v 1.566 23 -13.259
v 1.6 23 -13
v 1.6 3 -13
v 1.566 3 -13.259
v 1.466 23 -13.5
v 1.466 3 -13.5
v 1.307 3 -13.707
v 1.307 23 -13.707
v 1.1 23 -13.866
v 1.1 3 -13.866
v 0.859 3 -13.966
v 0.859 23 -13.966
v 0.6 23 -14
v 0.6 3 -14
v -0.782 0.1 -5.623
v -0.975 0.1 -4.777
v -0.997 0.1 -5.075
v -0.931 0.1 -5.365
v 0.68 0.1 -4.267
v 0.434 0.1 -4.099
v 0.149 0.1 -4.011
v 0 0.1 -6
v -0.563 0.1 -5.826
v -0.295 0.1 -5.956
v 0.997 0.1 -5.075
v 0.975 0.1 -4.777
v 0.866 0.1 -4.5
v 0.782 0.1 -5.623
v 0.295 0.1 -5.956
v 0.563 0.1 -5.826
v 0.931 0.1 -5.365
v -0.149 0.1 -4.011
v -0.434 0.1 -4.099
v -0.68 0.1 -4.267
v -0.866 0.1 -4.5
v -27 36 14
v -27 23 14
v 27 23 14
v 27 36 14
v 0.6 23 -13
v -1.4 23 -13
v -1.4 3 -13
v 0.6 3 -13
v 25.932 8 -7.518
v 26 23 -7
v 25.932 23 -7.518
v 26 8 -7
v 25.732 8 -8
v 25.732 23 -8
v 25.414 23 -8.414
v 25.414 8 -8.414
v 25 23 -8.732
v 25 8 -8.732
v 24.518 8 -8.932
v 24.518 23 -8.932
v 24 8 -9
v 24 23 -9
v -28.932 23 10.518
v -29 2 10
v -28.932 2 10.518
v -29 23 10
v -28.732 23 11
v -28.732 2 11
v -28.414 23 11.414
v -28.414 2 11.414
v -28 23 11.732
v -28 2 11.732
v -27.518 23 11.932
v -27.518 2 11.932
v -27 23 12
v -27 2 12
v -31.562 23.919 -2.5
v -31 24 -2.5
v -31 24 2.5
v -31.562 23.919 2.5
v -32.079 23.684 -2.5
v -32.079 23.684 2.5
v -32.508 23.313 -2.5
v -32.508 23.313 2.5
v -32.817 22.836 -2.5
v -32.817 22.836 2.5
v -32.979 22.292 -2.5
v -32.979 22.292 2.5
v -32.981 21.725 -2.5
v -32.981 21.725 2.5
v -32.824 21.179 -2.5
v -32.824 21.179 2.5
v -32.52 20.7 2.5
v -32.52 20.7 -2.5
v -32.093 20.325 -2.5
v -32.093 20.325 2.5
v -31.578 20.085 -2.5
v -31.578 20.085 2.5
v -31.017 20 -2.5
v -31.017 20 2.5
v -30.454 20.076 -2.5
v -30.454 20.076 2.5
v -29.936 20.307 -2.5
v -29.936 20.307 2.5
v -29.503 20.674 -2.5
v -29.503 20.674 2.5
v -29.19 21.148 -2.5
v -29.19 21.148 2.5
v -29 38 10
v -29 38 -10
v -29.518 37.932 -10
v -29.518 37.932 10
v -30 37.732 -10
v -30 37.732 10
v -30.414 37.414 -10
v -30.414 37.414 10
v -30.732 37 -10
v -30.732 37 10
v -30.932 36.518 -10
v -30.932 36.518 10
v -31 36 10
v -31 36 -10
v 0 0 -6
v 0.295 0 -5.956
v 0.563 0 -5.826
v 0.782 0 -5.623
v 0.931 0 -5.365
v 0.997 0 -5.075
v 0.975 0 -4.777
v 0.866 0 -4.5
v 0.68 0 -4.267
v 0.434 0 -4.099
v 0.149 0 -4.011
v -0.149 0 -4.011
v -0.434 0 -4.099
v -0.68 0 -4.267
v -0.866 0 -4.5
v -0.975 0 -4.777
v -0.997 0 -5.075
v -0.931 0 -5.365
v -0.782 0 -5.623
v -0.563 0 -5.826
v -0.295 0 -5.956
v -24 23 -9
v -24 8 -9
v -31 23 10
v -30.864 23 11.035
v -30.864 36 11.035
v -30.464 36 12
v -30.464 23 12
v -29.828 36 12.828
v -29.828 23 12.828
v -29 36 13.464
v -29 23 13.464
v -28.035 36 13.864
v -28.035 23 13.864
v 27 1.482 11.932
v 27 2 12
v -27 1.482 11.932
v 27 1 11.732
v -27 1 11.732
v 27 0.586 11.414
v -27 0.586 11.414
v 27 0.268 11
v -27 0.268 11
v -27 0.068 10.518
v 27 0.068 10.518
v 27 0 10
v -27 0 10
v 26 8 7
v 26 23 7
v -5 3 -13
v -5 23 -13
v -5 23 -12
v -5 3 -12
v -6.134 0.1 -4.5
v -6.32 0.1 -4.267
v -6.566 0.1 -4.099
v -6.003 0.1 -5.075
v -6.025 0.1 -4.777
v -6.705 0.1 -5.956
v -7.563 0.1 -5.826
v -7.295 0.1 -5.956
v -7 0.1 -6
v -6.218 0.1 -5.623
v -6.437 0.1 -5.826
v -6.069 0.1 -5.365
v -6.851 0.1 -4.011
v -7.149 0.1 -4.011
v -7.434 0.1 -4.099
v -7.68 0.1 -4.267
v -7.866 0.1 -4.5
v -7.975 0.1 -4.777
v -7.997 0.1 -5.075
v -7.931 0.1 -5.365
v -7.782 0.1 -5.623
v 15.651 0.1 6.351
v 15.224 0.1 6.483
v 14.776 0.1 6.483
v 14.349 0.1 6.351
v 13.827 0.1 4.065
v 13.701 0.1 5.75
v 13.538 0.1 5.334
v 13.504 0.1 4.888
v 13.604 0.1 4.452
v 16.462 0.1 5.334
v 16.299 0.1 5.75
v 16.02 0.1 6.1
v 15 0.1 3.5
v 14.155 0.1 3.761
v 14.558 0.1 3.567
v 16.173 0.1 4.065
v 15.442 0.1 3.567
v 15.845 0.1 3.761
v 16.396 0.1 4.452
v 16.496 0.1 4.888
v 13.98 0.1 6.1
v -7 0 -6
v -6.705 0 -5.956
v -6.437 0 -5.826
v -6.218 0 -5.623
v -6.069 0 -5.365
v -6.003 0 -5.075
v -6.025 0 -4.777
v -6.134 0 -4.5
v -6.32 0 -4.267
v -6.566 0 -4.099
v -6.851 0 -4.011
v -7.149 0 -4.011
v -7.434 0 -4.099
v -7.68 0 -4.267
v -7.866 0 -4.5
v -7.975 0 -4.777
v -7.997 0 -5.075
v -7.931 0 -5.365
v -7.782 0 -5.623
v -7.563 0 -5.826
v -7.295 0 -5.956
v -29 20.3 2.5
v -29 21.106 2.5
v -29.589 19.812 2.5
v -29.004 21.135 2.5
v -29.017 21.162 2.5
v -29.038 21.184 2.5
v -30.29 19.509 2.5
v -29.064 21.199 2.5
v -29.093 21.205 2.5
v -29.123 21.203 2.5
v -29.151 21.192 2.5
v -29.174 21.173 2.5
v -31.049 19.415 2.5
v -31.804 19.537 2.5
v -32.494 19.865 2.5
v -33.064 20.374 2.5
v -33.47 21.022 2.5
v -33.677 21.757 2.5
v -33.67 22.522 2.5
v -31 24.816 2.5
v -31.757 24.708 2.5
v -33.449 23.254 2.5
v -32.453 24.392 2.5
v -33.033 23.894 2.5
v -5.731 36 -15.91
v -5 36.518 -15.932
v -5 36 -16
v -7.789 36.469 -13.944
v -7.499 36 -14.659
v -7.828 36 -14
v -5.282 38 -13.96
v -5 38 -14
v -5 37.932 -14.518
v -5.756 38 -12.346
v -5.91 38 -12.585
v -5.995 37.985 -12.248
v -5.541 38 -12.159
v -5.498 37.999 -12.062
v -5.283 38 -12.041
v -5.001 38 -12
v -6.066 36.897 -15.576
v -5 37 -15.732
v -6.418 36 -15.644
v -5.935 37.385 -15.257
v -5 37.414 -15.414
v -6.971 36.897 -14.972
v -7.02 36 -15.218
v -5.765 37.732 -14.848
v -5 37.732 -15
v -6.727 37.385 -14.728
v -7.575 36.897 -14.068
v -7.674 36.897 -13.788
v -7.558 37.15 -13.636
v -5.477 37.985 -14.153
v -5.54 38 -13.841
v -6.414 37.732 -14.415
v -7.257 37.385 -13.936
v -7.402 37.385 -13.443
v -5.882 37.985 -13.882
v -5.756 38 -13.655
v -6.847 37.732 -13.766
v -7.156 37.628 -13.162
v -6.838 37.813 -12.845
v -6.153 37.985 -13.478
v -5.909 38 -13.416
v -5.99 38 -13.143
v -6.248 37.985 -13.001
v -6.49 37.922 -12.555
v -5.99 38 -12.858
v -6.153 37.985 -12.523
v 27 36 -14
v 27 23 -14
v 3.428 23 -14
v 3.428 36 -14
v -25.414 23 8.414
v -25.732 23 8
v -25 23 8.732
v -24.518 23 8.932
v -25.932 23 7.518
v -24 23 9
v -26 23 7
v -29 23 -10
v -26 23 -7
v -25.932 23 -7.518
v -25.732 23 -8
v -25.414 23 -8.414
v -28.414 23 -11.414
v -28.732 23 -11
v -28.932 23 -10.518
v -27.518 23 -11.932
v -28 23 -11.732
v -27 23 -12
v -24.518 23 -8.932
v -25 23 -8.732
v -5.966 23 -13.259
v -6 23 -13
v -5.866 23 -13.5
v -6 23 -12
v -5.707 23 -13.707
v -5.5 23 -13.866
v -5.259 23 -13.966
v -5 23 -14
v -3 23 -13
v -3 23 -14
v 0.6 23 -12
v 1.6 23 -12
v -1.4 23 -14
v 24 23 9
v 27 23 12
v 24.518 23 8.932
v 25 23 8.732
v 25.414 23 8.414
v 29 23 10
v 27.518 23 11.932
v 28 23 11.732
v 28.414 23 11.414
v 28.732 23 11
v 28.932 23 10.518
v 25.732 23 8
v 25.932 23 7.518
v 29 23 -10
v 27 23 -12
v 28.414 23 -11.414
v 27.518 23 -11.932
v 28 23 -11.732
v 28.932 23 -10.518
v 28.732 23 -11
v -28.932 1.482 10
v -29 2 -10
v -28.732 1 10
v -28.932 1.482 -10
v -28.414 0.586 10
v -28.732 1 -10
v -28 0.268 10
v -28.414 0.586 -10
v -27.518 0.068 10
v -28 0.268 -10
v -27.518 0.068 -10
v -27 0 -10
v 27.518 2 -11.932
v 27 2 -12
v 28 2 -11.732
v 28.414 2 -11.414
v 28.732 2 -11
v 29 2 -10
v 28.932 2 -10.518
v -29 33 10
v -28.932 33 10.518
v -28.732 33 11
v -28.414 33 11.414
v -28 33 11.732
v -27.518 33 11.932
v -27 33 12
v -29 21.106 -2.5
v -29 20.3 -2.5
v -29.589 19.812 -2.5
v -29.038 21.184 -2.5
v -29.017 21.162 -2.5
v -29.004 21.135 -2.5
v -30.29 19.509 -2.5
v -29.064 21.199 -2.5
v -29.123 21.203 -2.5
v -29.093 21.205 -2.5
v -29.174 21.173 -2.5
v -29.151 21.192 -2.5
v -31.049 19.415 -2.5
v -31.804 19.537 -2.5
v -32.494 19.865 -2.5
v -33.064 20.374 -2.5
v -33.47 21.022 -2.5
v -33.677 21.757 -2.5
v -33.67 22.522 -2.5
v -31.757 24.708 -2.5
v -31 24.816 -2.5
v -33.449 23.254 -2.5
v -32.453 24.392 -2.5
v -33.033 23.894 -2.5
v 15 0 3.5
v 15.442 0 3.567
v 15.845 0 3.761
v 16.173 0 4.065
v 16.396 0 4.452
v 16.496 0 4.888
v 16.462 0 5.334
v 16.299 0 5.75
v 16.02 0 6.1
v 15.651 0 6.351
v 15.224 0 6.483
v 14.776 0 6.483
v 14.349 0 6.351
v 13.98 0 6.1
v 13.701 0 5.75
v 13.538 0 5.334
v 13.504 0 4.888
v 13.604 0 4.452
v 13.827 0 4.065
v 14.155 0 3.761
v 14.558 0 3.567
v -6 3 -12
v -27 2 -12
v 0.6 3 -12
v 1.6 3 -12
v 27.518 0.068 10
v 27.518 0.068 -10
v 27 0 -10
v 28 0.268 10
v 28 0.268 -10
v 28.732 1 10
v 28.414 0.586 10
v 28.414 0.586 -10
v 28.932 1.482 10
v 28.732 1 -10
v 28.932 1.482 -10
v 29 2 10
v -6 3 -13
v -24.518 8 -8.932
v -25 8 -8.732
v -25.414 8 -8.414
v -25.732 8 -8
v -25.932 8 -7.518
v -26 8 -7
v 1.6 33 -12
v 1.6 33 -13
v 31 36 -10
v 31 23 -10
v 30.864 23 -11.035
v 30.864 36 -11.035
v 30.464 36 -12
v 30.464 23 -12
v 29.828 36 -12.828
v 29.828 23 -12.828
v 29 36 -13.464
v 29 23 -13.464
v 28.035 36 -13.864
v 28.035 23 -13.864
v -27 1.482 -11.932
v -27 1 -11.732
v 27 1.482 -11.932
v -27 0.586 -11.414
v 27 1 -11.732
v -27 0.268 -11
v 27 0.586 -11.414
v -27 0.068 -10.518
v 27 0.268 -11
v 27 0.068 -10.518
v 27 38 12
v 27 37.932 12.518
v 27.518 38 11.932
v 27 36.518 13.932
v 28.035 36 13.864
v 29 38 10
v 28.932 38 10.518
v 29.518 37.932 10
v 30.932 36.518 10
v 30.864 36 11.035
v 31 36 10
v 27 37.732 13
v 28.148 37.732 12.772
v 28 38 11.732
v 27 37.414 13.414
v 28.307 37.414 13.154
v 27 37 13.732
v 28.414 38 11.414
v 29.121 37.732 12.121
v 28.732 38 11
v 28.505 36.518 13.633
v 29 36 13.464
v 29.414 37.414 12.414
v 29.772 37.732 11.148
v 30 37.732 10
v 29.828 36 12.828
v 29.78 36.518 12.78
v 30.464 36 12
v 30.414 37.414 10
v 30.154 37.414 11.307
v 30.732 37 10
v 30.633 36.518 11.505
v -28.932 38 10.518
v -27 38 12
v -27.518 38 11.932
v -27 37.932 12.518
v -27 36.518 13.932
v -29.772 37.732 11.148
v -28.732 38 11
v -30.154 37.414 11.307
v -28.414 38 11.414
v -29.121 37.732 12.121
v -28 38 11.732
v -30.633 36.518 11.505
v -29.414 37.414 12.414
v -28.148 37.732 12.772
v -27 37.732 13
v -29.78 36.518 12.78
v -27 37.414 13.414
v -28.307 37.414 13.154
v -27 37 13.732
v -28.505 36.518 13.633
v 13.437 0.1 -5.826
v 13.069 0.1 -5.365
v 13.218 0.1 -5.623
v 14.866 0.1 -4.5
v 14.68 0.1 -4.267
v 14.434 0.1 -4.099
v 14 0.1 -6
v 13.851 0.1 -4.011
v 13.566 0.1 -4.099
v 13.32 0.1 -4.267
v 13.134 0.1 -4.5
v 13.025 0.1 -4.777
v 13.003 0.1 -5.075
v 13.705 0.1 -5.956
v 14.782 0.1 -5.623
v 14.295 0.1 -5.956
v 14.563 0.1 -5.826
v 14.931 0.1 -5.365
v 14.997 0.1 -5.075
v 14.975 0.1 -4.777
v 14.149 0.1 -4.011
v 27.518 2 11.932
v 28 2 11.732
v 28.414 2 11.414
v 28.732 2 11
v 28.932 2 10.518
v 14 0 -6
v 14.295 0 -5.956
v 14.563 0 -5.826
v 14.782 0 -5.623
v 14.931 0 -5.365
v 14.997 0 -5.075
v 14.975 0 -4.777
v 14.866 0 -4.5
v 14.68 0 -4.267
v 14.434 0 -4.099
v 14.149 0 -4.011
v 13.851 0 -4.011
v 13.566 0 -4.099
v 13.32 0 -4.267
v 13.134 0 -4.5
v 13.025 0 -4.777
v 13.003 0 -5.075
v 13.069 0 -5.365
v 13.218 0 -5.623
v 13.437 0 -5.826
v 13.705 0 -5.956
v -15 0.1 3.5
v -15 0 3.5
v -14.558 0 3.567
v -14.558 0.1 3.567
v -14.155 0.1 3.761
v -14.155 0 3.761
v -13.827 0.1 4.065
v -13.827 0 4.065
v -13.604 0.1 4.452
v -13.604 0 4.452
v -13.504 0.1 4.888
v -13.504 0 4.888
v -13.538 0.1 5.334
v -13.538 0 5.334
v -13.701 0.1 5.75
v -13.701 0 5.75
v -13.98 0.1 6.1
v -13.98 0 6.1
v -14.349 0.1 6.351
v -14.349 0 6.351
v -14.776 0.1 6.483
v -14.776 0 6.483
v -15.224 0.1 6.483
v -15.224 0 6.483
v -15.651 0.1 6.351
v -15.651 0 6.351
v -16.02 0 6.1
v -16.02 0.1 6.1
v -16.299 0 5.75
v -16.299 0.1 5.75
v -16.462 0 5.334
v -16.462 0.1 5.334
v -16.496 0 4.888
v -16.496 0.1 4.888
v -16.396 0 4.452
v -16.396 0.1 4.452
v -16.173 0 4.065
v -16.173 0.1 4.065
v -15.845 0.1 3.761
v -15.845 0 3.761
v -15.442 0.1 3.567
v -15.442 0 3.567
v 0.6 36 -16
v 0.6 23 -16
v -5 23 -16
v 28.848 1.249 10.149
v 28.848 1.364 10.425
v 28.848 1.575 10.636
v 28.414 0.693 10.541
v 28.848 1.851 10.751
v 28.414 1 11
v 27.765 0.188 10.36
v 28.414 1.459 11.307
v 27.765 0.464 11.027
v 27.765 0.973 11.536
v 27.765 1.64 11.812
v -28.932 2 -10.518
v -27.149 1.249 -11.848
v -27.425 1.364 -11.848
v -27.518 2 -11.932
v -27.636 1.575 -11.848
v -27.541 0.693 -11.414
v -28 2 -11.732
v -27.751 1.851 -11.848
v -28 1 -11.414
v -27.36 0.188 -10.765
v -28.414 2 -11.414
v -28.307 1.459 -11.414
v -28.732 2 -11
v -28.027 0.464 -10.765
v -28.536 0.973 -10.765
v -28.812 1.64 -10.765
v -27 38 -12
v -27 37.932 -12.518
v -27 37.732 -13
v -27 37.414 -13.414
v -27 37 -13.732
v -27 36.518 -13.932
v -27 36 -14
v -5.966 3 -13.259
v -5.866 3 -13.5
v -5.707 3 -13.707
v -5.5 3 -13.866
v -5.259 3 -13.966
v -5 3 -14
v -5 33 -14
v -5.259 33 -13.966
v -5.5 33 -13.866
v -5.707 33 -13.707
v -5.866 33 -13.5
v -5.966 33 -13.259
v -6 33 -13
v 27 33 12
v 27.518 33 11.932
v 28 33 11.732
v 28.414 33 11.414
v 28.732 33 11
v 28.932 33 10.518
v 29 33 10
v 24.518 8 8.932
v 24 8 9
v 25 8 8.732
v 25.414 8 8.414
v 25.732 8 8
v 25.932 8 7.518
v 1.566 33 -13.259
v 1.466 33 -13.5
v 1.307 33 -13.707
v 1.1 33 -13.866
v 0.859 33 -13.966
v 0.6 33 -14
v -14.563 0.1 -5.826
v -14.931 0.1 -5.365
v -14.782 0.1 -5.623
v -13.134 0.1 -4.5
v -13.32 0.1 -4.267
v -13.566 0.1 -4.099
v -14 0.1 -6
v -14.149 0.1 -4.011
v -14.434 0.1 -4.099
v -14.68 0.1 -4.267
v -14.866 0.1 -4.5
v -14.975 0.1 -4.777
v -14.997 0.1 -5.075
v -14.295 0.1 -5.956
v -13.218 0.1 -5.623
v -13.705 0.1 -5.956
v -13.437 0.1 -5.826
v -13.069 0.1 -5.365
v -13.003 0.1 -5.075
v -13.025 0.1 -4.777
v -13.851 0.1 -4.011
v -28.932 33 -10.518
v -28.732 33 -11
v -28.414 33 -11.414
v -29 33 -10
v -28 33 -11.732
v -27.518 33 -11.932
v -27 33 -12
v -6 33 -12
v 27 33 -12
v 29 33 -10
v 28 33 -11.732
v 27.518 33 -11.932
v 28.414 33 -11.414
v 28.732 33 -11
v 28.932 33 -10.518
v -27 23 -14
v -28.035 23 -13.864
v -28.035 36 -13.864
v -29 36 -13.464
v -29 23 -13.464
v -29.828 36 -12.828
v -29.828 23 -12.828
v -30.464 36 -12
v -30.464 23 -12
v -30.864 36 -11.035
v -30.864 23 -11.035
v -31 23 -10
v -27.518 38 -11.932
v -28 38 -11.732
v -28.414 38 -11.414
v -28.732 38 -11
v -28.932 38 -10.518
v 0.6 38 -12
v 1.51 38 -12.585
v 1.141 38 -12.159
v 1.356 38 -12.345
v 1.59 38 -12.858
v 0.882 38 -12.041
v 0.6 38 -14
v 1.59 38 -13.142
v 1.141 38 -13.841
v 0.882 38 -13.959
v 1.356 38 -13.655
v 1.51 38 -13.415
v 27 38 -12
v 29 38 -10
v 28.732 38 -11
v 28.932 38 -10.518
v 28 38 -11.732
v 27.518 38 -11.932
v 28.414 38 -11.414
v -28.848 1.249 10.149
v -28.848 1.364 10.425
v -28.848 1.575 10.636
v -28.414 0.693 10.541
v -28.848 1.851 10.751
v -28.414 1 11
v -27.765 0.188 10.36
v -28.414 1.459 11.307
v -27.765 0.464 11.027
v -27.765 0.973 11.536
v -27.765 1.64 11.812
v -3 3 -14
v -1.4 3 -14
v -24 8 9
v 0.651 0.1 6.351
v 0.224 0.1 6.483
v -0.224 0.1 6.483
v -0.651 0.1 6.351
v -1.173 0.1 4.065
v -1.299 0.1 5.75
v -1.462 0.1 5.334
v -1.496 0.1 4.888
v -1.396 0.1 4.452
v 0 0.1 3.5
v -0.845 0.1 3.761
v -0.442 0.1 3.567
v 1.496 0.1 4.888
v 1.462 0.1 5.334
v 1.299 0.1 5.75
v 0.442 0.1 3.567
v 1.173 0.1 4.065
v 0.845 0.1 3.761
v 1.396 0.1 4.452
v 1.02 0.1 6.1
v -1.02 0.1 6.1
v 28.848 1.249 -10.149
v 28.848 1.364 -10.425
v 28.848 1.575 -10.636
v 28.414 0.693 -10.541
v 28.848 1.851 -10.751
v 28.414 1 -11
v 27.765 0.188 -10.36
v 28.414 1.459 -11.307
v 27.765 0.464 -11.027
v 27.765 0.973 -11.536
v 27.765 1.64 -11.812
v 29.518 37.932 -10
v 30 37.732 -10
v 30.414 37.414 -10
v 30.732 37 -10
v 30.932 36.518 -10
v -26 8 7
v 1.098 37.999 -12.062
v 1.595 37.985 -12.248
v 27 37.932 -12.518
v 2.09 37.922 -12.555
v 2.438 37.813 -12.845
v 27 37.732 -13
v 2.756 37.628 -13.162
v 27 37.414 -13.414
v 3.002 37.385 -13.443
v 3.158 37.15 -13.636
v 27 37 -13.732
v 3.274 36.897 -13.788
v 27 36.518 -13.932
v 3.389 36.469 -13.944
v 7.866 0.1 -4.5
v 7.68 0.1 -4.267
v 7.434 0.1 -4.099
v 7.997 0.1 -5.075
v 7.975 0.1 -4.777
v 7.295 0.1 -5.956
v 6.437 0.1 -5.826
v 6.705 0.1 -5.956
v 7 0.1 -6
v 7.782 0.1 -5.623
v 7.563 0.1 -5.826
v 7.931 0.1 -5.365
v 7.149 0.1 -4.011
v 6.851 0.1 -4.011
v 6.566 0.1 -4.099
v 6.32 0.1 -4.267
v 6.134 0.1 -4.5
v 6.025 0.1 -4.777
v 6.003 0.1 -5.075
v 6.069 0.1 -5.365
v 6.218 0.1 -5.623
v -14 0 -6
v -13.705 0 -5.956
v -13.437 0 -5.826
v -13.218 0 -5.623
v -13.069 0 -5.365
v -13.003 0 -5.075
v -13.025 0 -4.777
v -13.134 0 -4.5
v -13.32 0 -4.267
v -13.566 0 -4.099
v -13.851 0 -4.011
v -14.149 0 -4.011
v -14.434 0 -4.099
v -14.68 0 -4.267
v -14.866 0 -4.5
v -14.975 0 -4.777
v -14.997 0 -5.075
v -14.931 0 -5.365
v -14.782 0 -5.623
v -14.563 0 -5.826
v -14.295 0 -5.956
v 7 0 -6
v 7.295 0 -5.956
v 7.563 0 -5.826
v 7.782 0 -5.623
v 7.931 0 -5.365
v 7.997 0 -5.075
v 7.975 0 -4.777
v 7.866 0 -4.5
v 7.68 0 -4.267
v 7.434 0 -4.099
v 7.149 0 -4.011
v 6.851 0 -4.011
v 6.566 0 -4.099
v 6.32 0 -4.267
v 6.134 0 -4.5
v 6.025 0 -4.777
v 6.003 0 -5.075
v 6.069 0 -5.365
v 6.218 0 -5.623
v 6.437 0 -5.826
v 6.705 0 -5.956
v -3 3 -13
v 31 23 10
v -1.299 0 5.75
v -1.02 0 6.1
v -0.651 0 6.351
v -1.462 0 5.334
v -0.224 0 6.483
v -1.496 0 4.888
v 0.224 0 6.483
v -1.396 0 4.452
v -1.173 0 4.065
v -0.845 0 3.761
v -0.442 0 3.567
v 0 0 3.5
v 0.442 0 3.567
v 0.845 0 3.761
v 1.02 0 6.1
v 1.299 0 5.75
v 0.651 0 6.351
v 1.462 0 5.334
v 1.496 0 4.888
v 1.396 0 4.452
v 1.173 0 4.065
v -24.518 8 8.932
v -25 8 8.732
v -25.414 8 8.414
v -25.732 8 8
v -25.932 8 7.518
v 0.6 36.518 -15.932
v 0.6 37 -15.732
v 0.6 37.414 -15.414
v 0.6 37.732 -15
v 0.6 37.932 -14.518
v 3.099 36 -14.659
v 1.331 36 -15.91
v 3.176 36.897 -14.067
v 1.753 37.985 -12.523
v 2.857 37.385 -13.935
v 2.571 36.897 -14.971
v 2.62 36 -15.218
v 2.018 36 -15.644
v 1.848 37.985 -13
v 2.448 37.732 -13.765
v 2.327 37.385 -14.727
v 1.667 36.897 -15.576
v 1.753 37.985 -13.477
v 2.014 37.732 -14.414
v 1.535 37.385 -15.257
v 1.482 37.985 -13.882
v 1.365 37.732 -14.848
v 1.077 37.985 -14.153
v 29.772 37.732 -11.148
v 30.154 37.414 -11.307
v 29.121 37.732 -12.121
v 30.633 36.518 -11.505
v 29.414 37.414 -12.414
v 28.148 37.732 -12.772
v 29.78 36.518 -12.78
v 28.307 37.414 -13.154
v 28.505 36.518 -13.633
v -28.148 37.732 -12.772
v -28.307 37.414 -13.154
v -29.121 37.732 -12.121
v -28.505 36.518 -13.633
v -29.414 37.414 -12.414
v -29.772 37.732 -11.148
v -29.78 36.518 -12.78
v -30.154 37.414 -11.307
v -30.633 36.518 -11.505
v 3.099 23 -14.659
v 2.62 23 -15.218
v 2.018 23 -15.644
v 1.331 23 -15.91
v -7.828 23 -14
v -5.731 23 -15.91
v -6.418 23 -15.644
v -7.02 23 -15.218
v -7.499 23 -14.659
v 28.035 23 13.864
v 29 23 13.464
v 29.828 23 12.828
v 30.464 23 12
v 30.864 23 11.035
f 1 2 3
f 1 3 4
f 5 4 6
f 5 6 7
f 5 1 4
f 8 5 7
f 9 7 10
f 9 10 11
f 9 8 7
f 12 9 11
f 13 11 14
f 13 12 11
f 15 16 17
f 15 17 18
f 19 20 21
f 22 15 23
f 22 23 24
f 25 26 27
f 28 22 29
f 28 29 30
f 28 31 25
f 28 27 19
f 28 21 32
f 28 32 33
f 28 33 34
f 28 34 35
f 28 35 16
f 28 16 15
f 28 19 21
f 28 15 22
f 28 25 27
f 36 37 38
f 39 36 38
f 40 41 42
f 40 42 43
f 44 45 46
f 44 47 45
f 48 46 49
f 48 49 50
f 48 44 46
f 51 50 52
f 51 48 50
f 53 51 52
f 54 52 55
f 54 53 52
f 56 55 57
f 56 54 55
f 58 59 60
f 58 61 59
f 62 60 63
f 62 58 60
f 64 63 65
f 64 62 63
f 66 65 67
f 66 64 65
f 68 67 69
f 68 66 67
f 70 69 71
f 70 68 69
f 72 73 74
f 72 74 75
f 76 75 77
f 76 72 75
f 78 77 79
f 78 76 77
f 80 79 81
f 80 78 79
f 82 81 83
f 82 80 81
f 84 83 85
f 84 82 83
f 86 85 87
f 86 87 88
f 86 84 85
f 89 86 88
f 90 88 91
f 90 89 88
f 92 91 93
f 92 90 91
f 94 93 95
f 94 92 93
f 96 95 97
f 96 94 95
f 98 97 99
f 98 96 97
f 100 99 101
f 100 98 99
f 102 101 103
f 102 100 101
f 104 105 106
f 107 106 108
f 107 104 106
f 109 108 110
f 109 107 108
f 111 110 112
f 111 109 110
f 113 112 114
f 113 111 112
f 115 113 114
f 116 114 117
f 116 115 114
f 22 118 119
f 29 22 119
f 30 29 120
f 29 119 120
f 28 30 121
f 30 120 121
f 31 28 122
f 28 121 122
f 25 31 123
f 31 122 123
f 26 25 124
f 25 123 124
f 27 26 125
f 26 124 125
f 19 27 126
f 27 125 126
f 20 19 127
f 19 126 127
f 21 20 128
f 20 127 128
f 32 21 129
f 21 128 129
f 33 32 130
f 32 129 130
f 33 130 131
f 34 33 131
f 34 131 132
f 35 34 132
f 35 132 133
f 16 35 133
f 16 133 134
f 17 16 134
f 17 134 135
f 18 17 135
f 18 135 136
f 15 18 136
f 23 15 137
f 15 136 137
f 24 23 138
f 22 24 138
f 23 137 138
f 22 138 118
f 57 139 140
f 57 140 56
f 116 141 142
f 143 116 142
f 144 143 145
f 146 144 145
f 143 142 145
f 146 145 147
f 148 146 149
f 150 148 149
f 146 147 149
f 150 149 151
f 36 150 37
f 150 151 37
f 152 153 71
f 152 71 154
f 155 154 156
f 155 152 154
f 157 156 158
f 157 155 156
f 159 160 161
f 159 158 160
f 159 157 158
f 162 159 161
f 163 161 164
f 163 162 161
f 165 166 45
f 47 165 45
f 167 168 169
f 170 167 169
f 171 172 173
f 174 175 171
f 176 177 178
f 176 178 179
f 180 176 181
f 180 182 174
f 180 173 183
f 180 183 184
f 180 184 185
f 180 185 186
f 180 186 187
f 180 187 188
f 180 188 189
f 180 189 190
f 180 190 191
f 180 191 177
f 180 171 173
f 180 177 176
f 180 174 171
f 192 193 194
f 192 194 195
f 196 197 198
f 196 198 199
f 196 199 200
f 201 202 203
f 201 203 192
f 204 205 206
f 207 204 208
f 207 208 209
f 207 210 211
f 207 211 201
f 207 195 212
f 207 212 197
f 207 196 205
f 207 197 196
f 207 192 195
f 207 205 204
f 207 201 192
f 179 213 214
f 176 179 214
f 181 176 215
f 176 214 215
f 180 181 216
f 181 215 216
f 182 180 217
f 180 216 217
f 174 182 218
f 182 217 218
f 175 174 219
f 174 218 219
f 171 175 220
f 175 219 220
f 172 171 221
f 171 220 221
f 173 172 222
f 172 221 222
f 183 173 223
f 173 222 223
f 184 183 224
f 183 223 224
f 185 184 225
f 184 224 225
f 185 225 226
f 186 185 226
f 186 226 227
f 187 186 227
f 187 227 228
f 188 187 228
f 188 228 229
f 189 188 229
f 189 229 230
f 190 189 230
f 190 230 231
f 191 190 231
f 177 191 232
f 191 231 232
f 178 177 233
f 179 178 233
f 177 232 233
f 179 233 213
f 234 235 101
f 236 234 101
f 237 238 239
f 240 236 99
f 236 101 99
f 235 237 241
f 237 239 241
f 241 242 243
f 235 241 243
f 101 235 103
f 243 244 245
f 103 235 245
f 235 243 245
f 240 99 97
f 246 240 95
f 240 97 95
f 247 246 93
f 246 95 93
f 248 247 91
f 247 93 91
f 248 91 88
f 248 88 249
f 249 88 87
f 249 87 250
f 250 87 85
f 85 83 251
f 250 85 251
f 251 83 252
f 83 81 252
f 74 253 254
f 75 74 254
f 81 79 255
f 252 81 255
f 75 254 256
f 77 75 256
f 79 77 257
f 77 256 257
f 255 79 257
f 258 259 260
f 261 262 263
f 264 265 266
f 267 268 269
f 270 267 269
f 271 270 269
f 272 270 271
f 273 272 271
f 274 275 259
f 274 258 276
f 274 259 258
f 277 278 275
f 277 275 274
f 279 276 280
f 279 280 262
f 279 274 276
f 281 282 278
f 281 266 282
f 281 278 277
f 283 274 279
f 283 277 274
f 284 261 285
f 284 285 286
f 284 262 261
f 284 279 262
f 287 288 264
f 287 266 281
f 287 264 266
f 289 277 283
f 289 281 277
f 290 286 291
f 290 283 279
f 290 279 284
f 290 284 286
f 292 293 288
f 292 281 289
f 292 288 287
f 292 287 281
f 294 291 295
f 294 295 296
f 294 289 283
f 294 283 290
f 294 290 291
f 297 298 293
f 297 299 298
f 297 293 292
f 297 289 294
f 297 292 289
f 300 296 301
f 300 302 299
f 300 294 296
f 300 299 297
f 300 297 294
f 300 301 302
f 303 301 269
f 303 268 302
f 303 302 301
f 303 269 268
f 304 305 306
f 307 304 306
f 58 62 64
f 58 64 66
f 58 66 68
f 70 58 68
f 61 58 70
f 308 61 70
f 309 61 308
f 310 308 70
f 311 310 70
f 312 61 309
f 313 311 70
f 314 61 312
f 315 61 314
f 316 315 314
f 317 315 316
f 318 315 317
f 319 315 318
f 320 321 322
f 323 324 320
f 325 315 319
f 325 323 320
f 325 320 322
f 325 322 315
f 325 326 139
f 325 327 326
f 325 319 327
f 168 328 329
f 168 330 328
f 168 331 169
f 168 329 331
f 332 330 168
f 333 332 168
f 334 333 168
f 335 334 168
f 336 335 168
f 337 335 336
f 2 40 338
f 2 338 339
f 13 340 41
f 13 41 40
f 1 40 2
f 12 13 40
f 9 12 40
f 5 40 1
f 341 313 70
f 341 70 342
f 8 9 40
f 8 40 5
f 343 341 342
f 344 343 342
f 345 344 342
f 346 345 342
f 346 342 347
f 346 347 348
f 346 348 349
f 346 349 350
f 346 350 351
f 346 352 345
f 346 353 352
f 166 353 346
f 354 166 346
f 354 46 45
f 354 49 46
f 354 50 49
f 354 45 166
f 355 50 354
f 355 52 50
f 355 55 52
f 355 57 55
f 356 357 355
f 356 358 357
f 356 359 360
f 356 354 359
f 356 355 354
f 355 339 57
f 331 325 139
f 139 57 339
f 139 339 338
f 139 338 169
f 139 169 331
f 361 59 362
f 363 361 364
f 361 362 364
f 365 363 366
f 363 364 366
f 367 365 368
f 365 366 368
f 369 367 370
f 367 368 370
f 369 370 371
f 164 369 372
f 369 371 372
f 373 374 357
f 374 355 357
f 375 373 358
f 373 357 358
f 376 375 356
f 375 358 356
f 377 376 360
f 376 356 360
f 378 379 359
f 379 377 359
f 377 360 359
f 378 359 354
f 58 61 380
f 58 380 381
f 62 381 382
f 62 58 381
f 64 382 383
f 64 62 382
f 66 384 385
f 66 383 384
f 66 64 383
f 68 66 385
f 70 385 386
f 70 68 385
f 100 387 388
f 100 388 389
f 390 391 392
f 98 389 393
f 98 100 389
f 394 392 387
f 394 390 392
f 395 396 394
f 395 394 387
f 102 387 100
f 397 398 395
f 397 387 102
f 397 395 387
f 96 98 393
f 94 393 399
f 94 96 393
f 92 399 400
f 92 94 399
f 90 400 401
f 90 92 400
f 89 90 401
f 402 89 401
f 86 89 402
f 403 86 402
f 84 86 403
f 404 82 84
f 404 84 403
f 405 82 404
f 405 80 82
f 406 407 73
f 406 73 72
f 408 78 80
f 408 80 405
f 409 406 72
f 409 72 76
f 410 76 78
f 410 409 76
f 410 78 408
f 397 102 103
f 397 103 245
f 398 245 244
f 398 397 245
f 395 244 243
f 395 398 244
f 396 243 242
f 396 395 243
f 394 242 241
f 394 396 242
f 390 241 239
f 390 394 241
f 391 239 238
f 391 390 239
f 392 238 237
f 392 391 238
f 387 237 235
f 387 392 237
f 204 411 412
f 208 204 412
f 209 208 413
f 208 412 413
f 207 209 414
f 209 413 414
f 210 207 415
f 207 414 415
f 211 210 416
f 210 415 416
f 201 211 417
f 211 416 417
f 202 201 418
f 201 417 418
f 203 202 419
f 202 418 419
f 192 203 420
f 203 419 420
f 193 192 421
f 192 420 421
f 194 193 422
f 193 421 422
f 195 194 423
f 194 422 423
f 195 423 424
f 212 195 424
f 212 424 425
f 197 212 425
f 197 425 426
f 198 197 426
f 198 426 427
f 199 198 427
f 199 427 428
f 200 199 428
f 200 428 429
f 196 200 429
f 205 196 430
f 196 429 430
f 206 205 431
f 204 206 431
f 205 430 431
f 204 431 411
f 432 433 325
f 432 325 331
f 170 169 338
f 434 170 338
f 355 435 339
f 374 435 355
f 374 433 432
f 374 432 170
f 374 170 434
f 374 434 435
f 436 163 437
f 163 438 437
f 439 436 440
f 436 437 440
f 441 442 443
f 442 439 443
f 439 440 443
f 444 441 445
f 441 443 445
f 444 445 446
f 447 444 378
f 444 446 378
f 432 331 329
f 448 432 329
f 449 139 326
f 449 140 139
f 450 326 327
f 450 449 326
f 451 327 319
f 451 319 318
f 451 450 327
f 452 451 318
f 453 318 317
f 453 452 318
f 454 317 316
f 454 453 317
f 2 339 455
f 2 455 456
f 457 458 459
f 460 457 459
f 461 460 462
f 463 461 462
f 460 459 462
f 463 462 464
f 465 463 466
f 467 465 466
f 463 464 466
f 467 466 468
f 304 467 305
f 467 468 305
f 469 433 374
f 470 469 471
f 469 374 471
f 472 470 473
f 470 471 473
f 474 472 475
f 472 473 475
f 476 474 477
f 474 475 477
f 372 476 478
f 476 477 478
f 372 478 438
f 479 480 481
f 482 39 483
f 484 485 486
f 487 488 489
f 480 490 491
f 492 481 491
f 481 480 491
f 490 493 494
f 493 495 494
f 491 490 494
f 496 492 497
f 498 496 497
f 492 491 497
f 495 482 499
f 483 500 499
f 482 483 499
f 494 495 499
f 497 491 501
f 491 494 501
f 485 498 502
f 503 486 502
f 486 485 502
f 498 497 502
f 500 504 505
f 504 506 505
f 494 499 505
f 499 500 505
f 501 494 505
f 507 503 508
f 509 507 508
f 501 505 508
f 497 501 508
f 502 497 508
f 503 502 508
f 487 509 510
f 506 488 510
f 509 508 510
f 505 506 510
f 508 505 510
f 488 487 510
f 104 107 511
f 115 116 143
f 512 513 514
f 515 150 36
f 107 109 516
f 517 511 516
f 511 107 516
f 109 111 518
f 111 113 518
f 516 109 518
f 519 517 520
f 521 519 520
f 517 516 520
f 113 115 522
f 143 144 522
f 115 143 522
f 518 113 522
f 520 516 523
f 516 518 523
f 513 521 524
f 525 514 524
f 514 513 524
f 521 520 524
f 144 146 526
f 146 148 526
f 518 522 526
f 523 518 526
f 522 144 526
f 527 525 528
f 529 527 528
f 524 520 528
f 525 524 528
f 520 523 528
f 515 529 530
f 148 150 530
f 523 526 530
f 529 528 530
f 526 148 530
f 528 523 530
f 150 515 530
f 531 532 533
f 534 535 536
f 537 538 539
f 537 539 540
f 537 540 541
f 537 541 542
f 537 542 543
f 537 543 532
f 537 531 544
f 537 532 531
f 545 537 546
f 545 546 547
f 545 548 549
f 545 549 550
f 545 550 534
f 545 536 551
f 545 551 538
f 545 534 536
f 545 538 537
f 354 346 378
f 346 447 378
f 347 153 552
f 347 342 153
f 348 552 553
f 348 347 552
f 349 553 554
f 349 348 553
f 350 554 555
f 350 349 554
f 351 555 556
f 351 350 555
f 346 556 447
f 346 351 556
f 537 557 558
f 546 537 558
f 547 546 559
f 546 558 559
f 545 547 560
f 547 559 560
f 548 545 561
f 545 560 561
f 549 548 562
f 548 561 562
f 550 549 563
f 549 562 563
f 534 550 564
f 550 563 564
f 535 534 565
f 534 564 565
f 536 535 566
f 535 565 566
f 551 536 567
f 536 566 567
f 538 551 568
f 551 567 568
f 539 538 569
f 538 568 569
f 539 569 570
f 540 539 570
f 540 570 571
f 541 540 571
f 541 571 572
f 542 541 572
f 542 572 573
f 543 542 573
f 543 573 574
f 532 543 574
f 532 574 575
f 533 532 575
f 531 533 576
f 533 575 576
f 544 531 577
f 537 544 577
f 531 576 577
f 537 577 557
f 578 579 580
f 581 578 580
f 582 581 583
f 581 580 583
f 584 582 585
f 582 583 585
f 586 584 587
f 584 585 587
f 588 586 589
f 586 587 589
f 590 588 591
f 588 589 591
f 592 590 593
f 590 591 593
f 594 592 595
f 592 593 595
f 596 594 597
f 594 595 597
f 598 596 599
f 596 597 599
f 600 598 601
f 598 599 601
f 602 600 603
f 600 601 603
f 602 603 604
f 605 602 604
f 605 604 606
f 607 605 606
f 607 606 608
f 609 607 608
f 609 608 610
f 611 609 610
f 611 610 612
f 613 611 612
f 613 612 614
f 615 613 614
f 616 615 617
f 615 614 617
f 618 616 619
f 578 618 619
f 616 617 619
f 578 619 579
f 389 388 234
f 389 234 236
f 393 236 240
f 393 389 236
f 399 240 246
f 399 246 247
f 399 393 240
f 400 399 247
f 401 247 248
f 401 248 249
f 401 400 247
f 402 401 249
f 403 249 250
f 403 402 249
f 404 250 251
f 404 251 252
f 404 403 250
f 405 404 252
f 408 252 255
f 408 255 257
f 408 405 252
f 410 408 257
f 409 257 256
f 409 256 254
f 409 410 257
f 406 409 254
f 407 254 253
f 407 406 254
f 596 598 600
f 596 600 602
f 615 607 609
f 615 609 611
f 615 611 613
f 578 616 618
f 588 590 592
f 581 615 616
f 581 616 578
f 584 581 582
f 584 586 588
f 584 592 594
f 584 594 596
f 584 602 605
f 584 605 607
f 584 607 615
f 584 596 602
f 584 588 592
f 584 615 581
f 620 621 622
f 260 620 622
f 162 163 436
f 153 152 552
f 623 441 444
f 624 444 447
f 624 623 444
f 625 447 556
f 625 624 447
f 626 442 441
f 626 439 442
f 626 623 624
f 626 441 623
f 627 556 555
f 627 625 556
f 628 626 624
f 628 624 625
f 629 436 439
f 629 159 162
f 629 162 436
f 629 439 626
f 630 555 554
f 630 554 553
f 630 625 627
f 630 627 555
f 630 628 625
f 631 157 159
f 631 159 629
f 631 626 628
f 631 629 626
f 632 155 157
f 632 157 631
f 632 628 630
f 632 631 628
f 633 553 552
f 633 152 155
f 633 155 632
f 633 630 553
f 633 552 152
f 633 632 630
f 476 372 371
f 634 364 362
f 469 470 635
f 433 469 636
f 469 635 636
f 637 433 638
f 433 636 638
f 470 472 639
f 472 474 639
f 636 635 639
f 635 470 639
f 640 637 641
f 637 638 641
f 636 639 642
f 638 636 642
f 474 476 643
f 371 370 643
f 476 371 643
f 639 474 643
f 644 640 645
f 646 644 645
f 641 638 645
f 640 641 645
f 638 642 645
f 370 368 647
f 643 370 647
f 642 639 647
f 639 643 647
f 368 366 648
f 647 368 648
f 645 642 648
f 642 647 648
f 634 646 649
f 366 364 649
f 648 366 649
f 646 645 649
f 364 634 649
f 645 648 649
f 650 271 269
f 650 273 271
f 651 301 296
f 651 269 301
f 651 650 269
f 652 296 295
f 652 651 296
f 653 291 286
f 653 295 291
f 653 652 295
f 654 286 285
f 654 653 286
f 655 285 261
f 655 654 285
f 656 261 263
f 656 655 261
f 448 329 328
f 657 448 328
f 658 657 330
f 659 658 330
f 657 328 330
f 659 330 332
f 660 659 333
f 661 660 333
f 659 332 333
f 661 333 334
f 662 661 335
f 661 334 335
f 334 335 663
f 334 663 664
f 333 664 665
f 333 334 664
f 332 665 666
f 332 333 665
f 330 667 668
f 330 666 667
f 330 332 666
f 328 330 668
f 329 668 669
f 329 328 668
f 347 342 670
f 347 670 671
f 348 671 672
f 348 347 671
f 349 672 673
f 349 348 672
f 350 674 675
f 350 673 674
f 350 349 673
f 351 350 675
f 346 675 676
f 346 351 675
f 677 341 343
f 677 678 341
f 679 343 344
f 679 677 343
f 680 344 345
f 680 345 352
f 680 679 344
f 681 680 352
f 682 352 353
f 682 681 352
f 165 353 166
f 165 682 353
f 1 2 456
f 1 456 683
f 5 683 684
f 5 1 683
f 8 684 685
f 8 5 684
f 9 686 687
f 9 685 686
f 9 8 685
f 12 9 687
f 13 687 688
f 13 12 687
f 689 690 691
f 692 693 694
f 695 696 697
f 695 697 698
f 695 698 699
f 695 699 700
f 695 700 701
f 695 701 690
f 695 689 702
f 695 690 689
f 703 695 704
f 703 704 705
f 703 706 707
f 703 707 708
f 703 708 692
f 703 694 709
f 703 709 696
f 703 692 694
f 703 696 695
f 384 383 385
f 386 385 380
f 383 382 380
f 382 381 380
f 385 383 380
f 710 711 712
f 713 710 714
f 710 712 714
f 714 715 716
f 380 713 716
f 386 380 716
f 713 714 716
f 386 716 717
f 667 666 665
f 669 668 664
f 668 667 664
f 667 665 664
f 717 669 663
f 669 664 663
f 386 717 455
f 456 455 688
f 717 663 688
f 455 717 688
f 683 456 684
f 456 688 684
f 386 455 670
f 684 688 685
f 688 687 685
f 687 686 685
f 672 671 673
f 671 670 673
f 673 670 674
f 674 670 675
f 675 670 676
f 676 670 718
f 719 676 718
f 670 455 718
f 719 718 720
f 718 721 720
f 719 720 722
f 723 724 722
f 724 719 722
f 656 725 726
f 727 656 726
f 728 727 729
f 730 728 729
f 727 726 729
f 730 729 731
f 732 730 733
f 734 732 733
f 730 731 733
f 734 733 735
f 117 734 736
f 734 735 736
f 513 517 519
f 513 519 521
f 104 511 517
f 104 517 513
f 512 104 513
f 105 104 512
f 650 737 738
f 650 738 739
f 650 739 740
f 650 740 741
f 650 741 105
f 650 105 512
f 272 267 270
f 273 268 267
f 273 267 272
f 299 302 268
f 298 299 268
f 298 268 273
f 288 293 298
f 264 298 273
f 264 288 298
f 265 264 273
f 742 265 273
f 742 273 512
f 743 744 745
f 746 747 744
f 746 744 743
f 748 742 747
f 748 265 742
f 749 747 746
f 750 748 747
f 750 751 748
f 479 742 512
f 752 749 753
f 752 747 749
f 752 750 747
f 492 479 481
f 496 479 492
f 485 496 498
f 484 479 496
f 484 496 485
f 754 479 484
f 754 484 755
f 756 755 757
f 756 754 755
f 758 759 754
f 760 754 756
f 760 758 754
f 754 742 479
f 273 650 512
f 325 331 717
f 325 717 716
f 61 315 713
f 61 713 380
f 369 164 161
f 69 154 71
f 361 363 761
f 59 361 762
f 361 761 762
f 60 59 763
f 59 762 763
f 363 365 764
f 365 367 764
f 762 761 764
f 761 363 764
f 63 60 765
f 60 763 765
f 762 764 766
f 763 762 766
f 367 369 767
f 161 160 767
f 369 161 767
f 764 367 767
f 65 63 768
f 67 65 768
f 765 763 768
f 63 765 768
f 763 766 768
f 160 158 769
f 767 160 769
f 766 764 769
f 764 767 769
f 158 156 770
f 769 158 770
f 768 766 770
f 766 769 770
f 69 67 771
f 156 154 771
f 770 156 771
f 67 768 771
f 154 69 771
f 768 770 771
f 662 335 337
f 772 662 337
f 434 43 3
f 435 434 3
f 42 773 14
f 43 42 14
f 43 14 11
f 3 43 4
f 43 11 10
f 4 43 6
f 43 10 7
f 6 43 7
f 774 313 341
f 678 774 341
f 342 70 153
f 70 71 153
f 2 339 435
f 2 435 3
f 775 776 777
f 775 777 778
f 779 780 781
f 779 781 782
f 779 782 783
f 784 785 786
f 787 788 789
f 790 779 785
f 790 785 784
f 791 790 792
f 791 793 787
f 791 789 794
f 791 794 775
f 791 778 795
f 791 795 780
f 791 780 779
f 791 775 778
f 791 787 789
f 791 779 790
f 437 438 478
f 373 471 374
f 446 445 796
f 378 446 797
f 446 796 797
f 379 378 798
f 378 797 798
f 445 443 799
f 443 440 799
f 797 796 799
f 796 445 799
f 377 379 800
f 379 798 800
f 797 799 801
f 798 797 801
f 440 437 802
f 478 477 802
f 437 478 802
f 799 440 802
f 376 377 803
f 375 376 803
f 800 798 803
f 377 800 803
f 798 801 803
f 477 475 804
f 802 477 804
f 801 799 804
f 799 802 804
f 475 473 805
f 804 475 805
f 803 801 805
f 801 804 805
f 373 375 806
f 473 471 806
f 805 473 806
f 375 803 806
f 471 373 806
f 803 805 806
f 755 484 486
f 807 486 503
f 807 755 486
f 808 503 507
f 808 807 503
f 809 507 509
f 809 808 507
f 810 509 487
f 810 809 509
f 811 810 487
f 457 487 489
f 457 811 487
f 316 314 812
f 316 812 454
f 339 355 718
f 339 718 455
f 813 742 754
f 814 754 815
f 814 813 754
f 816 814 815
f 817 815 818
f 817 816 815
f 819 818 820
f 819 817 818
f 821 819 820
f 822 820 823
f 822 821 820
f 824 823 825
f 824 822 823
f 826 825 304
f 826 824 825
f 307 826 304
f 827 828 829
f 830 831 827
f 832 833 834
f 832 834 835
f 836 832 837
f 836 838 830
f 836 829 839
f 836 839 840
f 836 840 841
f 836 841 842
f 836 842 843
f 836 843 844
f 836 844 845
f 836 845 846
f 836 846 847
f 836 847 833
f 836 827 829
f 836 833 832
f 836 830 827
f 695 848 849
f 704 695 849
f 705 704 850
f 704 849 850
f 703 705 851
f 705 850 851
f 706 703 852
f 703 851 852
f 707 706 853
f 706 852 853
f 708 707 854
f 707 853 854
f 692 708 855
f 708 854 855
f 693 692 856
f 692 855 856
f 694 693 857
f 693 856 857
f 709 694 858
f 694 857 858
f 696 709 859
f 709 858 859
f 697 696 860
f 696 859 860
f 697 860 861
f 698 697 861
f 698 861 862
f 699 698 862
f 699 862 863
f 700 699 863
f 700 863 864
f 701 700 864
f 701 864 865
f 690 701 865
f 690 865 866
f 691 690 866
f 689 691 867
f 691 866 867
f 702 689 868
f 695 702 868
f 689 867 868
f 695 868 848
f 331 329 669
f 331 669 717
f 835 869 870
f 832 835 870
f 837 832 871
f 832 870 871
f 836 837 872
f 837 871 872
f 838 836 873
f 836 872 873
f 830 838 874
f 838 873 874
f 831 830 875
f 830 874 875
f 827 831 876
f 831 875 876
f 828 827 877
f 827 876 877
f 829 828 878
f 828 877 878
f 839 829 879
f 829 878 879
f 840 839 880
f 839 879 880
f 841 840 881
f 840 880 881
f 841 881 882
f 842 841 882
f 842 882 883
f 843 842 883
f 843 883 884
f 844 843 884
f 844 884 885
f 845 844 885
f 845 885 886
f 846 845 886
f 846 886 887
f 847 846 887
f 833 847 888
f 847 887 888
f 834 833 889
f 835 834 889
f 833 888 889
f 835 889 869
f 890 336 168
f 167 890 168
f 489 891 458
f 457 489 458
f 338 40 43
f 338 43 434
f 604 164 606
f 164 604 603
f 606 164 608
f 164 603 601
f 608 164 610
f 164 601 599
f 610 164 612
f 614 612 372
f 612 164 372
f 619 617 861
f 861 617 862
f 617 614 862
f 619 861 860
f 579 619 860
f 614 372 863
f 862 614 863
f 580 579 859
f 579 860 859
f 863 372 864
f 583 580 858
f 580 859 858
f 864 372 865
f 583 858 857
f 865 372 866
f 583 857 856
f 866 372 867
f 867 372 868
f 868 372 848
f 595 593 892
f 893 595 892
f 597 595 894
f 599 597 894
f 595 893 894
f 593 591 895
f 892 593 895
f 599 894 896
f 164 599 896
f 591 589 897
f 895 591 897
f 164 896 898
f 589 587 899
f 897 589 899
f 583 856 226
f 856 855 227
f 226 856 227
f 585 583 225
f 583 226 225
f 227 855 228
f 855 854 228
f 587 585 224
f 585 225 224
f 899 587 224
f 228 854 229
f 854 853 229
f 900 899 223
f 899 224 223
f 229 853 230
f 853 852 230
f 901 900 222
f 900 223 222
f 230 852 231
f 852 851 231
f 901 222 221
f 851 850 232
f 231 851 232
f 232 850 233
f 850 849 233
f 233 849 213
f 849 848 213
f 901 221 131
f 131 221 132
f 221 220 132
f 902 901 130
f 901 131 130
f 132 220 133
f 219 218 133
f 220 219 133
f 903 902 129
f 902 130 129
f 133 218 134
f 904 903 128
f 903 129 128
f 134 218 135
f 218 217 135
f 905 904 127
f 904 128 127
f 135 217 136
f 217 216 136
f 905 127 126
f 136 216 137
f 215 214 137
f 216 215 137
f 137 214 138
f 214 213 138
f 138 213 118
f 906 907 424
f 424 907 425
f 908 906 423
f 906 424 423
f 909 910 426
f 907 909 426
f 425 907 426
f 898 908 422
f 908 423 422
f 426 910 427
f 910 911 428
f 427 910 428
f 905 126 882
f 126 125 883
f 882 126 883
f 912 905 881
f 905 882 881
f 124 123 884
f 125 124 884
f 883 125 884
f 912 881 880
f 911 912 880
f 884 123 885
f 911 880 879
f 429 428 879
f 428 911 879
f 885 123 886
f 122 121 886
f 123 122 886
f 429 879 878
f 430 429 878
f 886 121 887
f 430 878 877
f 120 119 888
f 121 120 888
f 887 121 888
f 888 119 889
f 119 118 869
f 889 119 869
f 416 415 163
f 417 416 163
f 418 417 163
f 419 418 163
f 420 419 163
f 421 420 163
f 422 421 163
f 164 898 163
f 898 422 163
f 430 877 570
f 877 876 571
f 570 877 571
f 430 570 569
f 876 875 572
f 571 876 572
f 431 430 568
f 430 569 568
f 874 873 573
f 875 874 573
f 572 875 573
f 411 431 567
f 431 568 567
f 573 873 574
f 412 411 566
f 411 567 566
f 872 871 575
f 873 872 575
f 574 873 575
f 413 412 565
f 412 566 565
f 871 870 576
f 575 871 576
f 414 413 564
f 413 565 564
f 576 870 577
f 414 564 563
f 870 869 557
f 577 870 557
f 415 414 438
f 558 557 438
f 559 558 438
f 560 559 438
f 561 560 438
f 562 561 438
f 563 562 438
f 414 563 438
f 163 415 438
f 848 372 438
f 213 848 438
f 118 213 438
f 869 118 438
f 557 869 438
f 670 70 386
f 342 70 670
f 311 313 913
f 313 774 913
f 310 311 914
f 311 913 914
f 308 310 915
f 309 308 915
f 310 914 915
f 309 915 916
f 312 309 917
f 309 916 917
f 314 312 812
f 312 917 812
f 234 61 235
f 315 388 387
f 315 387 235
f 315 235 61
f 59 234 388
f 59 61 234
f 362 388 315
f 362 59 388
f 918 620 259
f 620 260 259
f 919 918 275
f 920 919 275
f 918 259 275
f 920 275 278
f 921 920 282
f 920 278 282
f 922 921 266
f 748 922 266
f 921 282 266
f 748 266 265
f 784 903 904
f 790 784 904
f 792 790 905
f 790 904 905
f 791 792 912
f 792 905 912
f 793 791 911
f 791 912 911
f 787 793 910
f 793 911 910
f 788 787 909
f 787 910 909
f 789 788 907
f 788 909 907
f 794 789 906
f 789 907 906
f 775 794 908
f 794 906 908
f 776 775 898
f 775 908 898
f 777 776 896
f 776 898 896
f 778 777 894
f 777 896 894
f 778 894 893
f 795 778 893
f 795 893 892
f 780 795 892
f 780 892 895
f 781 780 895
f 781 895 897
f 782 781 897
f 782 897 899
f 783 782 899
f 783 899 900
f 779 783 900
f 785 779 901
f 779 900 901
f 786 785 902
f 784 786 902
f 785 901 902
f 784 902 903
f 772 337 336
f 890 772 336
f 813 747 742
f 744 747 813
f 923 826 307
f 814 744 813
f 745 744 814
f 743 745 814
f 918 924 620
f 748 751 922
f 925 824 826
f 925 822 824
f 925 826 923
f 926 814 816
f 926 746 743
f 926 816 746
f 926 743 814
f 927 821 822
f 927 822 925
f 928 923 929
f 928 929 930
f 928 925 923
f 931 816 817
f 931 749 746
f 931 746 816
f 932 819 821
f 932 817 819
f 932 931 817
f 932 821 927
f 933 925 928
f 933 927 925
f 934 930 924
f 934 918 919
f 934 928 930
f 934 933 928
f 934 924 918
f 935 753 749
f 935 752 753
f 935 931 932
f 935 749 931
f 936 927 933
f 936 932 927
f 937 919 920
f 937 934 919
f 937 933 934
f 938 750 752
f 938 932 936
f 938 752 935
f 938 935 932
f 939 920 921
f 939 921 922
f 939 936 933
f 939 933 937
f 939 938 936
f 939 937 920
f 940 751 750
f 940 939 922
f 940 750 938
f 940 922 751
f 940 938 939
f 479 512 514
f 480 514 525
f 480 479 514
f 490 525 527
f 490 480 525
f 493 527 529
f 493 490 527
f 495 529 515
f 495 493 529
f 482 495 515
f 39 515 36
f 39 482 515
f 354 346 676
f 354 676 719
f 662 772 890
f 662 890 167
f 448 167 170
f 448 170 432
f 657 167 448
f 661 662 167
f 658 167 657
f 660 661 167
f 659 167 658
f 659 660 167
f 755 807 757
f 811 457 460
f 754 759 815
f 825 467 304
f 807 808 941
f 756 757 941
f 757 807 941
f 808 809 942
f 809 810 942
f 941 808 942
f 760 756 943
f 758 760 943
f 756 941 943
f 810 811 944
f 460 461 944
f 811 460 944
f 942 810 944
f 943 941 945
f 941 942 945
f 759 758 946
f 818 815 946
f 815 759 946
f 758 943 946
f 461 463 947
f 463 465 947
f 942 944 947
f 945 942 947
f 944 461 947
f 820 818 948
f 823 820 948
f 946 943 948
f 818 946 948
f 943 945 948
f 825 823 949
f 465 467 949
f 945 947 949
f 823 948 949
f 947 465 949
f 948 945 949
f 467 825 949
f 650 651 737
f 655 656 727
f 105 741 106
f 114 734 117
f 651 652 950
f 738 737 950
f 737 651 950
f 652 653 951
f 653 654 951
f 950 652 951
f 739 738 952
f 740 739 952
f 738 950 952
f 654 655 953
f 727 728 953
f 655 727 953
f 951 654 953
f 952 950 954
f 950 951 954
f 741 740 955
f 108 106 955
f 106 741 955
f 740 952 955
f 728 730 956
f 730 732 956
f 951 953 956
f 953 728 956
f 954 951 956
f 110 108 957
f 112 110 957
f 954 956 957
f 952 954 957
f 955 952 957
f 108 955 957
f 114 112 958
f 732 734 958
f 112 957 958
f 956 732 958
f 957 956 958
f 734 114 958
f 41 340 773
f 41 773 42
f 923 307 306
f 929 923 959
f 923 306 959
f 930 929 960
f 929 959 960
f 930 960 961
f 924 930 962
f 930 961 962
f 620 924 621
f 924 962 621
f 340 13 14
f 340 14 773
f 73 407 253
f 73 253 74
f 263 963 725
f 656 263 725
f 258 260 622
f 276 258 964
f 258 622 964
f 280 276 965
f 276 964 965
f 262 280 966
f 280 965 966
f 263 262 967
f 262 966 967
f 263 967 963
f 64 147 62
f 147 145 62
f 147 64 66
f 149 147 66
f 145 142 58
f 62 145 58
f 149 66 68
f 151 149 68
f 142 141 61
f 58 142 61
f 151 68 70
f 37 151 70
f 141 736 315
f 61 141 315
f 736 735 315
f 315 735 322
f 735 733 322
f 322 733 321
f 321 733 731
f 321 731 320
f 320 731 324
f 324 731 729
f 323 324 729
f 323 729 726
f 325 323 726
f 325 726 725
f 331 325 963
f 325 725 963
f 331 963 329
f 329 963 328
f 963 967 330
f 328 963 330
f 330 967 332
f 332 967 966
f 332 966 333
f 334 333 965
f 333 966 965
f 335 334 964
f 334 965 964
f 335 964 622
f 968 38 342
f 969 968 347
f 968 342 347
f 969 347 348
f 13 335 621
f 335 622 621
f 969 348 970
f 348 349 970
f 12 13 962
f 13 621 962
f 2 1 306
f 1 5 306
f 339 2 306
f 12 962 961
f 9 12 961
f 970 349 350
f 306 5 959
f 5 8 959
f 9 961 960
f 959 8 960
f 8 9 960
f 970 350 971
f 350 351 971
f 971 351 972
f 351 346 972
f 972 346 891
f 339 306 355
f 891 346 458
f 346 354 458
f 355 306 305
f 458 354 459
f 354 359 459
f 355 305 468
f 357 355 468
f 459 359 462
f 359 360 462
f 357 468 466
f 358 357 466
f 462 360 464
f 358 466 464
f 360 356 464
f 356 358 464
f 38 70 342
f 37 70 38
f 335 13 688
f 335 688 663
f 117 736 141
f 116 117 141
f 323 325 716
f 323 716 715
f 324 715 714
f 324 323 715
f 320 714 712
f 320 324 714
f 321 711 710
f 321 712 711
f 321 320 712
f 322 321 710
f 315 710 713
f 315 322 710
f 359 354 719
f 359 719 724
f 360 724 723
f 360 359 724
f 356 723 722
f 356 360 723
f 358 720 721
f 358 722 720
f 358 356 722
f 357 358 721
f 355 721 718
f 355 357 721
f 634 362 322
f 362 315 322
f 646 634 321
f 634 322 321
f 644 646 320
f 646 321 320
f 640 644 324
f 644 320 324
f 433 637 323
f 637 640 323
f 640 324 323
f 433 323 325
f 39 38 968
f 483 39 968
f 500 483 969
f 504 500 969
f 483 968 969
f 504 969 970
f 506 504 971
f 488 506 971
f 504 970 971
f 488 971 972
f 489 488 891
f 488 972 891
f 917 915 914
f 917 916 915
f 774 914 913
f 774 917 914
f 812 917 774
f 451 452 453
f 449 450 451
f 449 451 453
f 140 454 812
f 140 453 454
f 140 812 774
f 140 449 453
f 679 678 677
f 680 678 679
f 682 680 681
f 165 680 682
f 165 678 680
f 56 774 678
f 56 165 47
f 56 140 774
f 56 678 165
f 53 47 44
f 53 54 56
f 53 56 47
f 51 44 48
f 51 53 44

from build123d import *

# Parameters (mm, degrees)
SKETCH_1_W           = 58
SKETCH_1_H           = 24
EXTRUDE_1_DEPTH      = 23
EXTRUDE_2_DEPTH      = 20
SKETCH_3_W           = 52
SKETCH_3_H           = 18
CUT_EXTRUDE_1_DEPTH  = 15
FILLET_1_R           = 2
EXTRUDE_3_DEPTH      = 15
EXTRUDE_9_DEPTH      = 2.5
EXTRUDE_9_DEPTH_BACK = 2.5
EXTRUDE_10_DEPTH     = 5
FILLET_3_R           = 2
FILLET_4_R           = 2
SKETCH_7_R           = 1.5
SKETCH_7_R_2         = 1
CUT_EXTRUDE_2_DEPTH  = 0.1


with BuildPart() as part:
    # ｽｹｯﾁ1 → ﾎﾞｽ - 押し出し1 (new body)
    with BuildSketch(Plane(origin=(0, 0, 0), x_dir=(1, 0, 0), z_dir=(0, 1, 0))):
        Rectangle(SKETCH_1_W, SKETCH_1_H)
    extrude(amount=EXTRUDE_1_DEPTH)

    # ｽｹｯﾁ2 → ﾎﾞｽ - 押し出し2 (add)
    with BuildSketch(Plane(origin=(0, 23, 0), x_dir=(1, 0, 0), z_dir=(0, 1, 0))):
        with BuildLine():
            Line((0.6, 13), (0.6, 12))
            Line((0.6, 12), (1.6, 12))
            Line((1.6, 12), (1.6, 13))
            ThreePointArc((1.6, 13), (1.307106781, 13.707106781), (0.6, 14))
            Line((0.6, 14), (-1.4, 14))
            Line((-1.4, 14), (-1.4, 13))
            Line((-1.4, 13), (0.6, 13))
        make_face()
        with BuildLine():
            Line((-5, 14), (-3, 14))
            Line((-3, 14), (-3, 13))
            Line((-3, 13), (-5, 13))
            Line((-5, 13), (-5, 12))
            Line((-5, 12), (-6, 12))
            Line((-6, 12), (-6, 13))
            ThreePointArc((-6, 13), (-5.707106781, 13.707106781), (-5, 14))
        make_face()
    extrude(amount=-EXTRUDE_2_DEPTH)

    # ｽｹｯﾁ3 → ｶｯﾄ - 押し出し1 (cut)
    with BuildSketch(Plane(origin=(0, 23, 0), x_dir=(1, 0, 0), z_dir=(0, 1, 0))):
        Rectangle(SKETCH_3_W, SKETCH_3_H)
    extrude(amount=-CUT_EXTRUDE_1_DEPTH, mode=Mode.SUBTRACT)

    # ﾌｨﾚｯﾄ1
    fillet_1_edges = [part.edges().sort_by_distance(p)[0] for p in [
        (0, 0, 12),
        (-29, 0, 0),
        (0, 0, -12),
        (26, 15.5, -9),
        (26, 15.5, 9),
        (-26, 15.5, 9),
        (-26, 15.5, -9),
        (29, 0, 0),
        (29, 11.5, 12),
        (-29, 11.5, 12),
        (-29, 11.5, -12),
        (29, 11.5, -12),
    ]]
    fillet(fillet_1_edges, radius=FILLET_1_R)

    # ｽｹｯﾁ5 → ﾎﾞｽ - 押し出し9 (add, two sides: drawn at the far end of the back side and taken through both)
    with BuildSketch(Plane.XY.offset(-EXTRUDE_9_DEPTH_BACK)):
        with BuildLine():
            Line((-31, 24.816348491), (-31, 24))
            ThreePointArc((-31, 24), (-32.688737819, 20.928475581), (-29.19047619, 21.14816458))
            ThreePointArc((-29.19047619, 21.14816458), (-29.078178211, 21.203162816), (-29, 21.105572809))
            Line((-29, 21.105572809), (-29, 20.3))
            ThreePointArc((-29, 20.3), (-33.469686402, 21.021673504), (-31, 24.816348491))
        make_face()
    extrude(amount=EXTRUDE_9_DEPTH + EXTRUDE_9_DEPTH_BACK)

    # ｽｹｯﾁ7 → ｶｯﾄ - 押し出し2 (cut)
    with BuildSketch(Plane.XZ):
        with Locations(Location((-15, 5, 0), (0, 0, 270))):
            Circle(SKETCH_7_R)
        with Locations(Location((0, 5, 0), (0, 0, 270))):
            Circle(SKETCH_7_R)
        with Locations(Location((15, 5, 0), (0, 0, 270))):
            Circle(SKETCH_7_R)
        with Locations(Location((0, -5, 0), (0, 0, 270))):
            Circle(SKETCH_7_R_2)
        with Locations(Location((7, -5, 0), (0, 0, 270))):
            Circle(SKETCH_7_R_2)
        with Locations(Location((14, -5, 0), (0, 0, 270))):
            Circle(SKETCH_7_R_2)
        with Locations(Location((-7, -5, 0), (0, 0, 270))):
            Circle(SKETCH_7_R_2)
        with Locations(Location((-14, -5, 0), (0, 0, 270))):
            Circle(SKETCH_7_R_2)
    extrude(amount=-CUT_EXTRUDE_2_DEPTH, mode=Mode.SUBTRACT)


with BuildPart() as body_2:
    # ｽｹｯﾁ4 → ﾎﾞｽ - 押し出し3 (new body)
    with BuildSketch(Plane(origin=(0, 23, 0), x_dir=(1, 0, 0), z_dir=(0, 1, 0))):
        with BuildLine():
            Line((-31, 10), (-31, -10))
            ThreePointArc((-31, -10), (-29.828427125, -12.828427125), (-27, -14))
            Line((-27, -14), (27, -14))
            ThreePointArc((27, -14), (29.828427125, -12.828427125), (31, -10))
            Line((31, -10), (31, 10))
            ThreePointArc((31, 10), (29.828427125, 12.828427125), (27, 14))
            Line((27, 14), (3.428427125, 14))
            ThreePointArc((3.428427125, 14), (2.332050808, 15.449489743), (0.6, 16))
            Line((0.6, 16), (-2.2, 16))
            Line((-2.2, 16), (-5, 16))
            ThreePointArc((-5, 16), (-6.732050808, 15.449489743), (-7.828427125, 14))
            Line((-7.828427125, 14), (-27, 14))
            ThreePointArc((-27, 14), (-29.828427125, 12.828427125), (-31, 10))
        make_face()
        with BuildLine():
            Line((-1.4, 14), (-3, 14))
            Line((-3, 14), (-5, 14))
            ThreePointArc((-5, 14), (-5.707106781, 13.707106781), (-6, 13))
            Line((-6, 13), (-6, 12))
            Line((-6, 12), (-27, 12))
            ThreePointArc((-27, 12), (-28.414213562, 11.414213562), (-29, 10))
            Line((-29, 10), (-29, -10))
            ThreePointArc((-29, -10), (-28.414213562, -11.414213562), (-27, -12))
            Line((-27, -12), (27, -12))
            ThreePointArc((27, -12), (28.414213562, -11.414213562), (29, -10))
            Line((29, -10), (29, 10))
            ThreePointArc((29, 10), (28.414213562, 11.414213562), (27, 12))
            Line((27, 12), (1.6, 12))
            Line((1.6, 12), (1.6, 13))
            ThreePointArc((1.6, 13), (1.307106781, 13.707106781), (0.6, 14))
            Line((0.6, 14), (-1.4, 14))
        make_face(mode=Mode.SUBTRACT)
    extrude(amount=EXTRUDE_3_DEPTH)

    # ｽｹｯﾁ6 → ﾎﾞｽ - 押し出し10 (add)
    with BuildSketch(Plane(origin=(0, 38, 0), x_dir=(1, 0, 0), z_dir=(0, 1, 0))):
        with BuildLine():
            Line((0.6, 16), (-5, 16))
            ThreePointArc((-5, 16), (-6.732050808, 15.449489743), (-7.828427125, 14))
            Line((-7.828427125, 14), (-27, 14))
            ThreePointArc((-27, 14), (-29.828427125, 12.828427125), (-31, 10))
            Line((-31, 10), (-31, -10))
            ThreePointArc((-31, -10), (-29.828427125, -12.828427125), (-27, -14))
            Line((-27, -14), (27, -14))
            ThreePointArc((27, -14), (29.828427125, -12.828427125), (31, -10))
            Line((31, -10), (31, 10))
            ThreePointArc((31, 10), (29.828427125, 12.828427125), (27, 14))
            Line((27, 14), (3.428427125, 14))
            ThreePointArc((3.428427125, 14), (2.332050808, 15.449489743), (0.6, 16))
        make_face()
    extrude(amount=-EXTRUDE_10_DEPTH)

    # ﾌｨﾚｯﾄ3
    fillet_3_edges = [body_2.edges().sort_by_distance(p)[0] for p in [
        (29.828427125, 38, -12.828427125),
        (15.214213562, 38, -14),
        (-17.414213562, 38, -14),
        (-29.828427125, 38, -12.828427125),
        (-31, 38, 0),
        (-29.828427125, 38, 12.828427125),
        (0, 38, 14),
        (29.828427125, 38, 12.828427125),
        (31, 38, 0),
    ]]
    fillet(fillet_3_edges, radius=FILLET_3_R)

    # ﾌｨﾚｯﾄ4
    fillet_4_edges = [body_2.edges().sort_by_distance(p)[0] for p in [
        (-7.449489743, 38, -14.732050808),
        (-2.2, 38, -16),
        (3.049489743, 38, -14.732050808),
    ]]
    fillet(fillet_4_edges, radius=FILLET_4_R)


solid = Compound([part.part, body_2.part])
